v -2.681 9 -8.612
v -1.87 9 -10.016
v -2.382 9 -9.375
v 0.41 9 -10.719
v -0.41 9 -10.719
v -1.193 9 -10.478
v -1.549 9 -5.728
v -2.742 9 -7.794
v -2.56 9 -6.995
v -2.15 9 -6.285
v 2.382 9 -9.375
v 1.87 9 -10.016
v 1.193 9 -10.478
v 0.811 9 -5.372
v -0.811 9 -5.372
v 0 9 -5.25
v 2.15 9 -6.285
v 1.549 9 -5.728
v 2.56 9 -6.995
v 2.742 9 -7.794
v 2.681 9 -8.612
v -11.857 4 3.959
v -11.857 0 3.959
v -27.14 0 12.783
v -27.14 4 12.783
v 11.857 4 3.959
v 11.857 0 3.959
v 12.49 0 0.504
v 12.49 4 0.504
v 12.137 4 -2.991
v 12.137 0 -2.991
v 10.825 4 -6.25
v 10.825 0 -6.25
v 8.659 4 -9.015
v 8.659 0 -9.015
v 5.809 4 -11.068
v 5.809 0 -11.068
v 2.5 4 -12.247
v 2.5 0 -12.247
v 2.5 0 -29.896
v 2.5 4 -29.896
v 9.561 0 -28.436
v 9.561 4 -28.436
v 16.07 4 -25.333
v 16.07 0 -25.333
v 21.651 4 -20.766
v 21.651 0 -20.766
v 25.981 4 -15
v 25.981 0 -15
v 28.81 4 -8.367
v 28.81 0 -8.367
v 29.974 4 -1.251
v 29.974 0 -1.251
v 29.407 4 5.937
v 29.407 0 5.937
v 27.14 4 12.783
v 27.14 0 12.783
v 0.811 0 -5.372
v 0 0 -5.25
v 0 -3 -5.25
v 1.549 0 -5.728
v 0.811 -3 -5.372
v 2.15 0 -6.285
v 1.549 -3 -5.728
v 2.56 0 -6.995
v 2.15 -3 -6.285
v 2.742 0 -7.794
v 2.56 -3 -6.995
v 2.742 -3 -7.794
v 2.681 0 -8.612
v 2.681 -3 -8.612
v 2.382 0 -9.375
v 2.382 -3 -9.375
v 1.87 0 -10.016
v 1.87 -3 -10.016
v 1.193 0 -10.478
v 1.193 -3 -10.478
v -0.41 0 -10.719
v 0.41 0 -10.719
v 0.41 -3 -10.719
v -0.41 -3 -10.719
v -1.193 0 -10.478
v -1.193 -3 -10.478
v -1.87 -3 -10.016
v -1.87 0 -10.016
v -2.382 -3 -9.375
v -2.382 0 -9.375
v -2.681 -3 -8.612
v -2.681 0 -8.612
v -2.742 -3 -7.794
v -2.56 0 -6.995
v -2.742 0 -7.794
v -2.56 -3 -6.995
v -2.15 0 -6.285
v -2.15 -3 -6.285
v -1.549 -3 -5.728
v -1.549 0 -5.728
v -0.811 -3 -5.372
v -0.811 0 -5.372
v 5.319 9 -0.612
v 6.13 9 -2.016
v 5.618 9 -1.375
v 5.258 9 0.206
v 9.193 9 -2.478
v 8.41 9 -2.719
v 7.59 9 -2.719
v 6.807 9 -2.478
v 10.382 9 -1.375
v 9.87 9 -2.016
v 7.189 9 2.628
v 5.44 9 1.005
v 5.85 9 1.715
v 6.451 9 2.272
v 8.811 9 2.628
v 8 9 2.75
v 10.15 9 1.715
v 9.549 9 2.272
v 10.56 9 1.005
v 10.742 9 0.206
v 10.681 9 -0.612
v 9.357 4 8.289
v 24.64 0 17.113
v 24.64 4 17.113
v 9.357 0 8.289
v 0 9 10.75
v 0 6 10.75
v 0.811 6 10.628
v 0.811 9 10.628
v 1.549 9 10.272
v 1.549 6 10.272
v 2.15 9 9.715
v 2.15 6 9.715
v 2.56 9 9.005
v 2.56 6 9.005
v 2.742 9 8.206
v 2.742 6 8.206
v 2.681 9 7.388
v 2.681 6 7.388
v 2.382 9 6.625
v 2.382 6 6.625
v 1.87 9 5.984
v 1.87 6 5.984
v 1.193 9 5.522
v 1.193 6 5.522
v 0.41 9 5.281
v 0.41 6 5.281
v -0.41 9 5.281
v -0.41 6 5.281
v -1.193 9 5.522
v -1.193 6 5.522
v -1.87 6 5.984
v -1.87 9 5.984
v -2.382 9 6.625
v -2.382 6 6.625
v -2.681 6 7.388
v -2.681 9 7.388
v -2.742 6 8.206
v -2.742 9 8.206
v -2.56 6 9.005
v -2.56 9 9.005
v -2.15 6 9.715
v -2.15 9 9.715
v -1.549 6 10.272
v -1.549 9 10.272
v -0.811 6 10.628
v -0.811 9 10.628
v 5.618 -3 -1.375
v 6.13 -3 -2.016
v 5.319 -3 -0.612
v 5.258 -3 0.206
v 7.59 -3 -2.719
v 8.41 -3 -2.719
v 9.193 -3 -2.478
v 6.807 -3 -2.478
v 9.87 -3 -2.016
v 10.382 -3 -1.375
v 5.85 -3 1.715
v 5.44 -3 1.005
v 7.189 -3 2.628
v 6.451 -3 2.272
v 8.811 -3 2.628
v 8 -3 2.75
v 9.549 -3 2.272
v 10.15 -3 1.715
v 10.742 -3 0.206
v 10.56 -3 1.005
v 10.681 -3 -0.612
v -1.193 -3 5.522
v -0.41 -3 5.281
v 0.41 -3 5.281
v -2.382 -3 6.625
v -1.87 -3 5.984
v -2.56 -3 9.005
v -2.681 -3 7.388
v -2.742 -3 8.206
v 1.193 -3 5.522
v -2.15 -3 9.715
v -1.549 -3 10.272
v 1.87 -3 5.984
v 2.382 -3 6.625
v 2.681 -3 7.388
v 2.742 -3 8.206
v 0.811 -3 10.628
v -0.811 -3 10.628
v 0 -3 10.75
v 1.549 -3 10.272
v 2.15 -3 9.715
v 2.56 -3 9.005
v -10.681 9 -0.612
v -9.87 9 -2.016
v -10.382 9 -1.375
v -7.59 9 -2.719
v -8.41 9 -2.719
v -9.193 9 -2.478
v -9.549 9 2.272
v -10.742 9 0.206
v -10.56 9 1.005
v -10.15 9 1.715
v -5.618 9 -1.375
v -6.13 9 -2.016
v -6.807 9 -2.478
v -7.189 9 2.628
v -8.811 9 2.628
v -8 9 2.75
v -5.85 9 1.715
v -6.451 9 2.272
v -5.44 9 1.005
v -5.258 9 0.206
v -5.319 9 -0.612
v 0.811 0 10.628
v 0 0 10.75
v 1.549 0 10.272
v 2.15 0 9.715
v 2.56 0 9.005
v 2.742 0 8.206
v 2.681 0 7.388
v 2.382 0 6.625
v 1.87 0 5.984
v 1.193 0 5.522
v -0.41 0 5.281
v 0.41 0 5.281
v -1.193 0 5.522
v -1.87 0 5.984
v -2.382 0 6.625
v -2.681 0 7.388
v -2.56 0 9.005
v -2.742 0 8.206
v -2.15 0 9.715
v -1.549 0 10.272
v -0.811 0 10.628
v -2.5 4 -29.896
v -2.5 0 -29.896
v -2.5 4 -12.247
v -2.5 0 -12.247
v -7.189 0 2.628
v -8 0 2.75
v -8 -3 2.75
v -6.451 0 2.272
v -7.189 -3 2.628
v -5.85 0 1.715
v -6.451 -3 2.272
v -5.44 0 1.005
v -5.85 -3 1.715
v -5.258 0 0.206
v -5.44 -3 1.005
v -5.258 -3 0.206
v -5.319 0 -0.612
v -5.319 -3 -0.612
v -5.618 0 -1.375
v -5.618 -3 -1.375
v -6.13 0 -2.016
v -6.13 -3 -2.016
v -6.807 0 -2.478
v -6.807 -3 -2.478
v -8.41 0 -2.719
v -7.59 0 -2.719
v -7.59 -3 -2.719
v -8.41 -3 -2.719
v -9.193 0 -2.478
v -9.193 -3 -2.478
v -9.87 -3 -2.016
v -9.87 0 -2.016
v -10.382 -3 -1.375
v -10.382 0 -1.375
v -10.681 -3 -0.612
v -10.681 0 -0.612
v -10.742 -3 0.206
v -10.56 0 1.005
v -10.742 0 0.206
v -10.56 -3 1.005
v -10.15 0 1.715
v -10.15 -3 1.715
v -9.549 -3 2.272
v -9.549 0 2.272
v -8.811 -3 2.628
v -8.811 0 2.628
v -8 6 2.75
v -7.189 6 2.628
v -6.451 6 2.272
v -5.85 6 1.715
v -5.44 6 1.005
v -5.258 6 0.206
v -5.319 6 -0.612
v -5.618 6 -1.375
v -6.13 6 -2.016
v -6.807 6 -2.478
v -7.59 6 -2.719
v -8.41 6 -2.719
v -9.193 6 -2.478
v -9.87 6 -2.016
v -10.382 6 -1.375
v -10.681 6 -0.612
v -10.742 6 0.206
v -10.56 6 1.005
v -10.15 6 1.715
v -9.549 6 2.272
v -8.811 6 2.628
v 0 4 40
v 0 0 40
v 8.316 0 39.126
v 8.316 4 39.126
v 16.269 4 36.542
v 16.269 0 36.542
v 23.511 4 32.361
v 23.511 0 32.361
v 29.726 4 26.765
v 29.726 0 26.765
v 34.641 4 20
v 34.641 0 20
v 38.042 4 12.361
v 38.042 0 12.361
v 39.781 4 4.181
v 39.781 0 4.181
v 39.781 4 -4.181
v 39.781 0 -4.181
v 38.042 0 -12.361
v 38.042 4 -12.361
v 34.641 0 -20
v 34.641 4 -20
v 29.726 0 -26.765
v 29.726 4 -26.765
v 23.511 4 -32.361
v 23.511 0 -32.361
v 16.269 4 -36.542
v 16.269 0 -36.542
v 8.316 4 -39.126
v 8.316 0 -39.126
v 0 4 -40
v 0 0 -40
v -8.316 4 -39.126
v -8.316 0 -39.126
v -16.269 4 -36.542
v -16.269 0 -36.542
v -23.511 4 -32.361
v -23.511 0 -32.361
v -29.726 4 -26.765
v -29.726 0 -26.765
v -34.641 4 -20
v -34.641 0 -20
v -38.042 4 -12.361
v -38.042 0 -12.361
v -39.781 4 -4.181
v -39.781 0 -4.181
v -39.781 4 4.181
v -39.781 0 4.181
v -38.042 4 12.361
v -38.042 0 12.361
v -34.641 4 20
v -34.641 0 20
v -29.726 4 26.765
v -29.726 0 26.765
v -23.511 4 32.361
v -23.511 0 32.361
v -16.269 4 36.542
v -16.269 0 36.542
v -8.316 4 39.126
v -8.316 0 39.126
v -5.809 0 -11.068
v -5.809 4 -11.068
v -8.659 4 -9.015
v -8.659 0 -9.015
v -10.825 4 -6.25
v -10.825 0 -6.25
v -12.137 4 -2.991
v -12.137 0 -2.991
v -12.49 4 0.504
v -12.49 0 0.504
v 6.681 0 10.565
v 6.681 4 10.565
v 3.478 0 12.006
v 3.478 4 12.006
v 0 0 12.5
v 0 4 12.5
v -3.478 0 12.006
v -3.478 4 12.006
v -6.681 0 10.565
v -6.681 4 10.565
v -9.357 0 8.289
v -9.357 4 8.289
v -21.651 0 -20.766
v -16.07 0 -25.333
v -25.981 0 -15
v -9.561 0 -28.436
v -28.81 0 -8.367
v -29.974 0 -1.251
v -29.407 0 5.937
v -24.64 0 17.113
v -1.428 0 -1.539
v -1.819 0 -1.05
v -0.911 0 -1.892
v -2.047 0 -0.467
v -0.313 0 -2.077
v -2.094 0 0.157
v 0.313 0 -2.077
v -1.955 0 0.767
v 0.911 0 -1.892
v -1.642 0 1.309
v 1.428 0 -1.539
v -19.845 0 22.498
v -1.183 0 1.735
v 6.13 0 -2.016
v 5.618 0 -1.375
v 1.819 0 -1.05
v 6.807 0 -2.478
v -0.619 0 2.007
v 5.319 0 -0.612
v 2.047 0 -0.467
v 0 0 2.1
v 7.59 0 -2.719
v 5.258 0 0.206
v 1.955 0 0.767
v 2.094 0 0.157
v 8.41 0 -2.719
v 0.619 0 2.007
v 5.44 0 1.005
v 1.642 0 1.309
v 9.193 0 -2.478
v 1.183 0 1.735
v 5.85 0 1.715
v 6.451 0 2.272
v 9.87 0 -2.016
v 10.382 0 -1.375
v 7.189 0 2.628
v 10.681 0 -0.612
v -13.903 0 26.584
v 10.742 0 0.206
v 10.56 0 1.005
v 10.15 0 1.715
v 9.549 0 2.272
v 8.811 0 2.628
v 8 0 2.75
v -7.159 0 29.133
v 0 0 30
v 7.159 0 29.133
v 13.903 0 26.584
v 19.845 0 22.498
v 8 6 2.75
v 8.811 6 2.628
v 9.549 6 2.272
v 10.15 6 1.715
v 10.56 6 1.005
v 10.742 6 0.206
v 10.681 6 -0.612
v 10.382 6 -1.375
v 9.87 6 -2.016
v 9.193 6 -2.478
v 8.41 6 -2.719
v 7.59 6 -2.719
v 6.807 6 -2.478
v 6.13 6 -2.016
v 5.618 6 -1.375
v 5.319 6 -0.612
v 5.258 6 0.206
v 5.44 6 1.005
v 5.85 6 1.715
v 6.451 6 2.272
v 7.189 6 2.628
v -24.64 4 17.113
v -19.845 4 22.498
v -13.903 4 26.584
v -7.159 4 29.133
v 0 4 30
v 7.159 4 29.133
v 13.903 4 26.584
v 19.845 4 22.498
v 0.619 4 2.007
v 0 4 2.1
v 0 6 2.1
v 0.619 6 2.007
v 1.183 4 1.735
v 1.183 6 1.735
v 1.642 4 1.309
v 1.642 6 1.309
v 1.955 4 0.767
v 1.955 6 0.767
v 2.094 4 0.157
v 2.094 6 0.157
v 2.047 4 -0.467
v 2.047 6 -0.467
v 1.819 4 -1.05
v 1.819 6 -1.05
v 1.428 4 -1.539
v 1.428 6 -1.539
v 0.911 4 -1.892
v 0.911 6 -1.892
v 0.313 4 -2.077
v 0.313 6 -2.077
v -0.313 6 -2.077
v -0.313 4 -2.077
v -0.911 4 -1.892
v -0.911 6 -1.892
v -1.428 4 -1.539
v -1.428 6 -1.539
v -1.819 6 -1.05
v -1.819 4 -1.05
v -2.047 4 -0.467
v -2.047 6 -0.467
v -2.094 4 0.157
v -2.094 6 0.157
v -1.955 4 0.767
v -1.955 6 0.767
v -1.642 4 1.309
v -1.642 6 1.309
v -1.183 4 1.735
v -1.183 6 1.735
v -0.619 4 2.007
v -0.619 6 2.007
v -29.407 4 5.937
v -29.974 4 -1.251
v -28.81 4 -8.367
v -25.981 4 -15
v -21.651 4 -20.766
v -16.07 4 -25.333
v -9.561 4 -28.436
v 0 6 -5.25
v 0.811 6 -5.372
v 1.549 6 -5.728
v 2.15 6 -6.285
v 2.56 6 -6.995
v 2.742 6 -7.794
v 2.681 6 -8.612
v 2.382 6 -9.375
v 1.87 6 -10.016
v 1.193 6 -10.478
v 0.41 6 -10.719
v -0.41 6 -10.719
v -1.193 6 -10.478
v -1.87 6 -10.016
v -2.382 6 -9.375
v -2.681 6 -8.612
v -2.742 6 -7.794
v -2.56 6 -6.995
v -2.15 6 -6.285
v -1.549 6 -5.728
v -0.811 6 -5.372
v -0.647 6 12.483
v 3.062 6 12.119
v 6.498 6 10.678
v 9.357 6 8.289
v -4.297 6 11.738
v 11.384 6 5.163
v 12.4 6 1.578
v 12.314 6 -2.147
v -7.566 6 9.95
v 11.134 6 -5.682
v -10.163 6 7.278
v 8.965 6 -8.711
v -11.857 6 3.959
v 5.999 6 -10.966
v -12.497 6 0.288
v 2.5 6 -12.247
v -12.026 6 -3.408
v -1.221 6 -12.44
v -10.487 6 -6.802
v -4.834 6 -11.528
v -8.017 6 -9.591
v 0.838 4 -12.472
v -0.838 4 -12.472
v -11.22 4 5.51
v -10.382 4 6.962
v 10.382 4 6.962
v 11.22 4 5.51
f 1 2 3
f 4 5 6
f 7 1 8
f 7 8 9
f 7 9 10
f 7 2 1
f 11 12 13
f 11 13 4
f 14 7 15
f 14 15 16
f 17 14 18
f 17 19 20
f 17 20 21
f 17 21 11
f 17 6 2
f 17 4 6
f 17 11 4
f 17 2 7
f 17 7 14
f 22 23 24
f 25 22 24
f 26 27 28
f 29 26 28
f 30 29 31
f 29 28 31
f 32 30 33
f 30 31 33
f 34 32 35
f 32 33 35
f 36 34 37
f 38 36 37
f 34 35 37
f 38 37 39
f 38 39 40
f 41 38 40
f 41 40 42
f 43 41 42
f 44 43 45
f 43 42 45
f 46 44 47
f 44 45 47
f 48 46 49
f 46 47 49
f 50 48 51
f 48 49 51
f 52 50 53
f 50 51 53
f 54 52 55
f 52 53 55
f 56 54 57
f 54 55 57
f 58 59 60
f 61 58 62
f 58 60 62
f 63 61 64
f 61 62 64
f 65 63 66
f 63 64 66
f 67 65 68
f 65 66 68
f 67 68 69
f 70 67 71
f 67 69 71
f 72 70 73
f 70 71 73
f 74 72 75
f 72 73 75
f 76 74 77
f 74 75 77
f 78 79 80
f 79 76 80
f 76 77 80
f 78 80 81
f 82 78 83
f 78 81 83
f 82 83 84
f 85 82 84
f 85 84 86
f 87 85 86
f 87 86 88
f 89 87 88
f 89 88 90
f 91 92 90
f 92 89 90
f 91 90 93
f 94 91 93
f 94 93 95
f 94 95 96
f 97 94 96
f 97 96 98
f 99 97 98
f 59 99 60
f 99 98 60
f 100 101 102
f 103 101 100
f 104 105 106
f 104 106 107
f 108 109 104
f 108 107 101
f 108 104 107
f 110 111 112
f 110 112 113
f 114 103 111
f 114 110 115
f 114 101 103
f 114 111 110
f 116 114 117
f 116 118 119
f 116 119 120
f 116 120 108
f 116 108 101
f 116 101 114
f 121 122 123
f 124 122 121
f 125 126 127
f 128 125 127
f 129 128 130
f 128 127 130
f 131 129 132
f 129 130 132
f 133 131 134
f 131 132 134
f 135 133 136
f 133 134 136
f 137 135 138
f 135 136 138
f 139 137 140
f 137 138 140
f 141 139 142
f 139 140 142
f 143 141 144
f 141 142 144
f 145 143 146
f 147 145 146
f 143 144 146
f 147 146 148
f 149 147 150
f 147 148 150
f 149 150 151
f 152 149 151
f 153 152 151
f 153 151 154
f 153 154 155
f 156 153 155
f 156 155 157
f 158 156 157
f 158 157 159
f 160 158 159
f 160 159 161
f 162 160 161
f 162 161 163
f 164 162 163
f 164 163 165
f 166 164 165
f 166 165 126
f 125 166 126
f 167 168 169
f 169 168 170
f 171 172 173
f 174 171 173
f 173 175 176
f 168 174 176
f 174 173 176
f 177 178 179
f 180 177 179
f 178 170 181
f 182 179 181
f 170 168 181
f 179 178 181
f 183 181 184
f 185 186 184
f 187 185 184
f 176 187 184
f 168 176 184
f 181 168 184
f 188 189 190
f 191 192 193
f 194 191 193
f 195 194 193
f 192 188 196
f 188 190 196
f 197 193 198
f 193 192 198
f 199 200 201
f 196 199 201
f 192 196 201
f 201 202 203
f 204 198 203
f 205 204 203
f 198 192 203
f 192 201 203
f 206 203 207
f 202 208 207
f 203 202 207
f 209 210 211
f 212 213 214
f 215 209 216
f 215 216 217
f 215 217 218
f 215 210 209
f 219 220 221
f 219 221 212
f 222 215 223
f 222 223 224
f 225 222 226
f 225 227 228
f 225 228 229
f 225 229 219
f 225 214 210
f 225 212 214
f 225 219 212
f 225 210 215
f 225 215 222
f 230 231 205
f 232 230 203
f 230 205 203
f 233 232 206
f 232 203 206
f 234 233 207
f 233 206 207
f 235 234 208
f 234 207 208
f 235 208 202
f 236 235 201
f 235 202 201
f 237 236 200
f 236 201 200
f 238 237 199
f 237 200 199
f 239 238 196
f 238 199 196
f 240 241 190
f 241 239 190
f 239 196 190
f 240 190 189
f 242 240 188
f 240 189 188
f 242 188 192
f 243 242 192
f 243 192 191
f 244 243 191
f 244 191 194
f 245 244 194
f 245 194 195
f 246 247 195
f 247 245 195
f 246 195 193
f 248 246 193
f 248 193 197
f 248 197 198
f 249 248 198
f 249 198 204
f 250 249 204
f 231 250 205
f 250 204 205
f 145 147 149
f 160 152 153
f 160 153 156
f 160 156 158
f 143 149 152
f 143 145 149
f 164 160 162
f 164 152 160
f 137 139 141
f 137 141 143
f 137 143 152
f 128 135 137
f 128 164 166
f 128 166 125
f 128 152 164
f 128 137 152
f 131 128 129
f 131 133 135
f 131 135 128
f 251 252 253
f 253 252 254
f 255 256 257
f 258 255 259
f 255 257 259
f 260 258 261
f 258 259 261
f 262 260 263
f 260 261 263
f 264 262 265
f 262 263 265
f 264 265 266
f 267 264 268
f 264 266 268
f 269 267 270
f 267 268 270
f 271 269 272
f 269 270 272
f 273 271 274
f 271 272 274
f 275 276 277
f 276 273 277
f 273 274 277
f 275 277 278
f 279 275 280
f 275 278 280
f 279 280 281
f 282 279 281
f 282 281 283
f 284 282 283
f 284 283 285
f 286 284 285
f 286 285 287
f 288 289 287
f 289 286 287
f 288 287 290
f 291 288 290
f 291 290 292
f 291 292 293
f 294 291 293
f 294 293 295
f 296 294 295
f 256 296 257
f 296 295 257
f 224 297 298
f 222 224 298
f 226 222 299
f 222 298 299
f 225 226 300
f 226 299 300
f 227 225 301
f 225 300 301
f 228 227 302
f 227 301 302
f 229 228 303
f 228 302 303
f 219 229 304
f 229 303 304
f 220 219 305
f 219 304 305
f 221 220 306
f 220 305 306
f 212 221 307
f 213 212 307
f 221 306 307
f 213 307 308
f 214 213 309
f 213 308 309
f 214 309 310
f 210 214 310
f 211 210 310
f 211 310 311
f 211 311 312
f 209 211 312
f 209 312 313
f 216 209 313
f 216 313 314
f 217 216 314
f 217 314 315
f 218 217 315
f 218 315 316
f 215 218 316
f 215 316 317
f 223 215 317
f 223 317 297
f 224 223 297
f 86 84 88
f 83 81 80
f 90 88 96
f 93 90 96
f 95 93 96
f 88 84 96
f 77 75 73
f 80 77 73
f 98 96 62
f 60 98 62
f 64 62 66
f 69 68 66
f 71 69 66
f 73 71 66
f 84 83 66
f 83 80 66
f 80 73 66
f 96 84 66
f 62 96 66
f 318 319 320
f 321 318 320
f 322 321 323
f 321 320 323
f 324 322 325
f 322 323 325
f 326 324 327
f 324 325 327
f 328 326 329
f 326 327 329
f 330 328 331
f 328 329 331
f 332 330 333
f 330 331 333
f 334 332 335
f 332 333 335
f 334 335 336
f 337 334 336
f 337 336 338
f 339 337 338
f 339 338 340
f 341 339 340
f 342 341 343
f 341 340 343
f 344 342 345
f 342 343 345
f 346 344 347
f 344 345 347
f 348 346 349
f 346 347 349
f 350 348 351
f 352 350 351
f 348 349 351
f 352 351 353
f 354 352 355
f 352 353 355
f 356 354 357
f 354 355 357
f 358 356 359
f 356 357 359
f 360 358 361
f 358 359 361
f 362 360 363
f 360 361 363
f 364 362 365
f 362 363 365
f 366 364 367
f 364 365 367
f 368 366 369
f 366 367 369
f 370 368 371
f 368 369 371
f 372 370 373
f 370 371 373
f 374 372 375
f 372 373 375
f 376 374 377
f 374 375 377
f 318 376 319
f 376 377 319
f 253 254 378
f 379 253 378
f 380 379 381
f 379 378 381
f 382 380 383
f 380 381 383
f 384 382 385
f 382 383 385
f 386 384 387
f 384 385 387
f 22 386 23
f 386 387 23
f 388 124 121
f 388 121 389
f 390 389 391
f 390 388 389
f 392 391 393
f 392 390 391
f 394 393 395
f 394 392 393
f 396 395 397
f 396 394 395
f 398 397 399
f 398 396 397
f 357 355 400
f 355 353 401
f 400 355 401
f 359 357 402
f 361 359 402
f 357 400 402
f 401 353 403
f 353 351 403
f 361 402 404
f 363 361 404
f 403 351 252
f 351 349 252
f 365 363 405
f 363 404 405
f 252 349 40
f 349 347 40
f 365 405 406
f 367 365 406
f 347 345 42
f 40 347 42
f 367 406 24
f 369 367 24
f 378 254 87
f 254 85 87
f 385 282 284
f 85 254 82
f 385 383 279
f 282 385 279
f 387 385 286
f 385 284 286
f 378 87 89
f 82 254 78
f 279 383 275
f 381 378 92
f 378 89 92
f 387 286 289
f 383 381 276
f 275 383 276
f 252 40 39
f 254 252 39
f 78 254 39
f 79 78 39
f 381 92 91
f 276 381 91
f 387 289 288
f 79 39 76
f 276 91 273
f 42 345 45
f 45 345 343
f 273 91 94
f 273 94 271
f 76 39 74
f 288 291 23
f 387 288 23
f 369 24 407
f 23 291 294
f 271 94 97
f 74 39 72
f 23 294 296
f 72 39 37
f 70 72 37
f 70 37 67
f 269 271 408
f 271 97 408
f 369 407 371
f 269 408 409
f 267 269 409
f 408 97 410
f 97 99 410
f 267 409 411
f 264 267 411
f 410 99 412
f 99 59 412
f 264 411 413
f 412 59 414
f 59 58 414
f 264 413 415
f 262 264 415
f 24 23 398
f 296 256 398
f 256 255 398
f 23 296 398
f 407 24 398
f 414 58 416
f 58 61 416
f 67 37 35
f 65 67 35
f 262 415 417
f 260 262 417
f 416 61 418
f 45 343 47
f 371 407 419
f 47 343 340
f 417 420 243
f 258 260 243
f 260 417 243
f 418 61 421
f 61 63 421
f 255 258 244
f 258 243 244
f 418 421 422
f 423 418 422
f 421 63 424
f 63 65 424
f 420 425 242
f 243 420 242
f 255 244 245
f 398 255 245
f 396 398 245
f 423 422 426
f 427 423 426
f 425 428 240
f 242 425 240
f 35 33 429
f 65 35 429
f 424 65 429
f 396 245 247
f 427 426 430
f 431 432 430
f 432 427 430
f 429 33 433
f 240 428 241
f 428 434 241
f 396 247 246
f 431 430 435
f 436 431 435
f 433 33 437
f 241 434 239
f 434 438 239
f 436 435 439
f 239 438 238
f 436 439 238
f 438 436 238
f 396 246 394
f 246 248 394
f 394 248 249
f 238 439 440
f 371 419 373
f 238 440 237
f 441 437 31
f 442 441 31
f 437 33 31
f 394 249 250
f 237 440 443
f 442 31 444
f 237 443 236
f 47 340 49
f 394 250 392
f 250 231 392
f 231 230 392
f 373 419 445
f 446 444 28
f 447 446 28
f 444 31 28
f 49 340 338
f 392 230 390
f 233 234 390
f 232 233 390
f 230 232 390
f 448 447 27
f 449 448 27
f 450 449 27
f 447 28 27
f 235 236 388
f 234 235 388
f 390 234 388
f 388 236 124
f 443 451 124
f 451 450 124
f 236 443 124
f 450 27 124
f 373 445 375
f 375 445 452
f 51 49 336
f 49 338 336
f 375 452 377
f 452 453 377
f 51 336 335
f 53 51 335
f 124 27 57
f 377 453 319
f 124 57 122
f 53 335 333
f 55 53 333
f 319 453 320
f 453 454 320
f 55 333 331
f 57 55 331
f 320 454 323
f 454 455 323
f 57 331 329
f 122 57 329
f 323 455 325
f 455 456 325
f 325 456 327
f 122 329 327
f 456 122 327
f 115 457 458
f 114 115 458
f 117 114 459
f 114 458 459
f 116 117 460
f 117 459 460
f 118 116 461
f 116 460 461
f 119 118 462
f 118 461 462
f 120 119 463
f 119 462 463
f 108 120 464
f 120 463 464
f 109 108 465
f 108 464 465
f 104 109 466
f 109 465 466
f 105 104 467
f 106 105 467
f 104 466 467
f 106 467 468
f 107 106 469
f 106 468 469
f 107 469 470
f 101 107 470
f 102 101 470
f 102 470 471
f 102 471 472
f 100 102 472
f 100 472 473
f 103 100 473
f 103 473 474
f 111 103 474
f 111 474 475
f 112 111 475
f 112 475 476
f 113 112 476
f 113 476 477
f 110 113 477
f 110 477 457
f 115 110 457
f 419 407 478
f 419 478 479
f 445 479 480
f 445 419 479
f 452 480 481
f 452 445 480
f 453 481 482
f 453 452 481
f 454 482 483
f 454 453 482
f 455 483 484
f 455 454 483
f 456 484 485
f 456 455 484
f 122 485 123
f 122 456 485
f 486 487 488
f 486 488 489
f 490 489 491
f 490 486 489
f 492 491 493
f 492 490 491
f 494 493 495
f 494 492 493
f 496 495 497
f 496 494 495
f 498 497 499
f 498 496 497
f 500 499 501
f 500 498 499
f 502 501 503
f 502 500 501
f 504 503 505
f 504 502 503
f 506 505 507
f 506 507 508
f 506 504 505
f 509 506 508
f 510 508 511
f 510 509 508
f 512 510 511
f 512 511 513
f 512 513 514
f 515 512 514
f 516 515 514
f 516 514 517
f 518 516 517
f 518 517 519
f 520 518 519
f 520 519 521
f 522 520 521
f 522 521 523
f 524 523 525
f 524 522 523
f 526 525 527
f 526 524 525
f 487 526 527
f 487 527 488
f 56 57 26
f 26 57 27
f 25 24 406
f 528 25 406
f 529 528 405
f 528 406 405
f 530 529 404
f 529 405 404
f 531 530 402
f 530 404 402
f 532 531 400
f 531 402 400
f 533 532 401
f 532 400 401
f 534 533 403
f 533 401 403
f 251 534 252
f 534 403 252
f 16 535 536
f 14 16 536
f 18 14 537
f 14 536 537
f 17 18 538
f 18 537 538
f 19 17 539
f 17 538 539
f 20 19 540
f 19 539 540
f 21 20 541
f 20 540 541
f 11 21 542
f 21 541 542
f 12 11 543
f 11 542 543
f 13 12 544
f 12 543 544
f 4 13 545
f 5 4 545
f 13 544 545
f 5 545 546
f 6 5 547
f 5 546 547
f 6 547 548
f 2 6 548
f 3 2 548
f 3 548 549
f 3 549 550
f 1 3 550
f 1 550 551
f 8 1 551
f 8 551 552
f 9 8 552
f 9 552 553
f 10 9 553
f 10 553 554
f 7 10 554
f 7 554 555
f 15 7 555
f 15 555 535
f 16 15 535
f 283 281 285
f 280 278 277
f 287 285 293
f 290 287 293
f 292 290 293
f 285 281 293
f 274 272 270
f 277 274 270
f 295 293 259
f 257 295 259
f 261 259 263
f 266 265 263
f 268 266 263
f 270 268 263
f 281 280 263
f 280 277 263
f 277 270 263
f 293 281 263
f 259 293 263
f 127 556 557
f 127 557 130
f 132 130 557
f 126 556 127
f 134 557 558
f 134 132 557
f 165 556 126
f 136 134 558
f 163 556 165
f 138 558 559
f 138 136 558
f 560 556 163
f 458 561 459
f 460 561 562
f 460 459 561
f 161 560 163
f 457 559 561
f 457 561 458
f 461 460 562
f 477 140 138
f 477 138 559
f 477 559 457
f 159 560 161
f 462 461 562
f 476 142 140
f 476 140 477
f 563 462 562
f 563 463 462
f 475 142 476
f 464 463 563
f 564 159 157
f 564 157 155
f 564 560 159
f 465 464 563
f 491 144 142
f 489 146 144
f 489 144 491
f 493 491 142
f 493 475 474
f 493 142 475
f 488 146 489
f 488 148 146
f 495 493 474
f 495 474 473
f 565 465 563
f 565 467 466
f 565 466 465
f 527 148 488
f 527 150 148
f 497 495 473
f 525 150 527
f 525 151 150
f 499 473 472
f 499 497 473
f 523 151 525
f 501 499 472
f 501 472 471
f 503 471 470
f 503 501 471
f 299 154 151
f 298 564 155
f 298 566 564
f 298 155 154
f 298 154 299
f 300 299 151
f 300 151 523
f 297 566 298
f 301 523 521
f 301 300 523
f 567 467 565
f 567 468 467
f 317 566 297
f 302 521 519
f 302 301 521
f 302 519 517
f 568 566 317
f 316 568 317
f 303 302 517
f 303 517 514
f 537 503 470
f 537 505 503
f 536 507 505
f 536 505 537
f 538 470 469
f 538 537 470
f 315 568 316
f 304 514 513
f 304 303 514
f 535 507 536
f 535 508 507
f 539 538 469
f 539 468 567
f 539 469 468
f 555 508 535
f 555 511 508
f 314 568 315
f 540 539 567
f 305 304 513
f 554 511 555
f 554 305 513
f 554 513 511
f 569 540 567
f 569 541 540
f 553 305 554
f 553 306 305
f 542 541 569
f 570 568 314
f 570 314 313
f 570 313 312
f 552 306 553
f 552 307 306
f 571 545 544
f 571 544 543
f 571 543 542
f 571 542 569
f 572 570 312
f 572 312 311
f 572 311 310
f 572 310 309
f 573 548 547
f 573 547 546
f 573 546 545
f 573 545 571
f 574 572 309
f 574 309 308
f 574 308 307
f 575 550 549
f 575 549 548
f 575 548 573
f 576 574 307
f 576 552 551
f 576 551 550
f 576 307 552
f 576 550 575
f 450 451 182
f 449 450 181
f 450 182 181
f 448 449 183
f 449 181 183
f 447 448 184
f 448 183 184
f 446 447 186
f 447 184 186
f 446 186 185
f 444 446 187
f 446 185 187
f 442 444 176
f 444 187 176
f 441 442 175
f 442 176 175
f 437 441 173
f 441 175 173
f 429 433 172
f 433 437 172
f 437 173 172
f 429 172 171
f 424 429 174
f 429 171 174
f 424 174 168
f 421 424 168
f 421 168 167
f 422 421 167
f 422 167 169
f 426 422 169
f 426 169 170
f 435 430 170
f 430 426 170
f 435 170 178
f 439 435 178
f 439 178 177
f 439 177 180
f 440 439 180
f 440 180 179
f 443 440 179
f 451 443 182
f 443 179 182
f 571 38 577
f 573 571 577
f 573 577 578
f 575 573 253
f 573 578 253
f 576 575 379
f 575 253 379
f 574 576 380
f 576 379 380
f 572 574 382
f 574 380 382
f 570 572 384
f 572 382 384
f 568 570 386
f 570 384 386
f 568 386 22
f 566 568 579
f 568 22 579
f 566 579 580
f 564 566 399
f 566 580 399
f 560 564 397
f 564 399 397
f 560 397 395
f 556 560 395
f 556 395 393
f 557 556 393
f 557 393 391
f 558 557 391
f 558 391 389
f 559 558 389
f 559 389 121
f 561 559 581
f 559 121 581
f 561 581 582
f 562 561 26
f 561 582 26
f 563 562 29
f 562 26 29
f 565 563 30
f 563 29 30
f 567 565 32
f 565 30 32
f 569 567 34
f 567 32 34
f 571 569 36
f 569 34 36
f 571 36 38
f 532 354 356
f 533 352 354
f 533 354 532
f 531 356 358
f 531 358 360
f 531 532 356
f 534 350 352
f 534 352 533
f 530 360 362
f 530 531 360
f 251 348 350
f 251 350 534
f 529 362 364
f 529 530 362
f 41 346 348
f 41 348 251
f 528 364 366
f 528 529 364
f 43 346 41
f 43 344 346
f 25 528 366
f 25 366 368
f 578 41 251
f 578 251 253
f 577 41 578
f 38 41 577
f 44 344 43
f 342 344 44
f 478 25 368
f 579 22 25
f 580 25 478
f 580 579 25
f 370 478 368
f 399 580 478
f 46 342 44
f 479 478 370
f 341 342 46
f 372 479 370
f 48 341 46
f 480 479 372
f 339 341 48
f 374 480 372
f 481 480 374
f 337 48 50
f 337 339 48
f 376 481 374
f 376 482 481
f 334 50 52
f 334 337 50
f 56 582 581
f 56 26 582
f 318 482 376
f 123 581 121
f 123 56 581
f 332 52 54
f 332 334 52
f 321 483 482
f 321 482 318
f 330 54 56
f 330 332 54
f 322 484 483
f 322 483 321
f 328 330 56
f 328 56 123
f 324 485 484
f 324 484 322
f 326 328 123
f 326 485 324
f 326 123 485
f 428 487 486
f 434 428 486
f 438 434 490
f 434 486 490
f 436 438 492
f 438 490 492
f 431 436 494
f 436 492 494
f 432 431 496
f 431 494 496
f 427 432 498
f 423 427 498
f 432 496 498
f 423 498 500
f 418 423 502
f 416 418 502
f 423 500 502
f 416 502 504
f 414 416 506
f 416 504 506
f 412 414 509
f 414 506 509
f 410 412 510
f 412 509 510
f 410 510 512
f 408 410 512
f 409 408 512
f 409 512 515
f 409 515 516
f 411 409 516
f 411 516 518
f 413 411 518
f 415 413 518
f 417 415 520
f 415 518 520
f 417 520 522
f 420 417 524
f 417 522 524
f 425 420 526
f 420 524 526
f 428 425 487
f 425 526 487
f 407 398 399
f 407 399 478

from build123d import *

# Parameters (mm, degrees)
ESBO_O1_R                     = 40
RESSALTO_EXTRUS_O1_DEPTH      = 4
ESBO_O2_R                     = 2.1
CORTE_EXTRUS_O1_DEPTH         = 4
ESBO_O3_R                     = 12.5
ESBO_O3_R_2                   = 2.1
RESSALTO_EXTRUS_O2_DEPTH      = 2
RESSALTO_EXTRUS_O3_DEPTH      = 3
RESSALTO_EXTRUS_O3_DEPTH_BACK = 9
ESBO_O4_R                     = 2.75


with BuildPart() as part:
    # Esboço1 → Ressalto-extrusão1 (new body)
    with BuildSketch(Plane(origin=(0, 0, 0), x_dir=(1, 0, 0), z_dir=(0, 1, 0))):
        Circle(ESBO_O1_R)
        with BuildLine():
            Line((-9.356601718, -8.288787866), (-24.640393972, -17.112889438))
            ThreePointArc((-24.640393972, -17.112889438), (0, -30), (24.640393972, -17.112889438))
            Line((24.640393972, -17.112889438), (9.356601718, -8.288787866))
            ThreePointArc((9.356601718, -8.288787866), (0, -12.5), (-9.356601718, -8.288787866))
        make_face(mode=Mode.SUBTRACT)
        with BuildLine():
            Line((-11.856601718, -3.958660847), (-27.140393972, -12.782762419))
            ThreePointArc((-27.140393972, -12.782762419), (-25.980762114, 15), (-2.5, 29.895651858))
            Line((-2.5, 29.895651858), (-2.5, 12.247448714))
            ThreePointArc((-2.5, 12.247448714), (-10.825317547, 6.25), (-11.856601718, -3.958660847))
        make_face(mode=Mode.SUBTRACT)
        with BuildLine():
            Line((2.5, 12.247448714), (2.5, 29.895651858))
            ThreePointArc((2.5, 29.895651858), (25.980762114, 15), (27.140393972, -12.782762419))
            Line((27.140393972, -12.782762419), (11.856601718, -3.958660847))
            ThreePointArc((11.856601718, -3.958660847), (10.825317547, 6.25), (2.5, 12.247448714))
        make_face(mode=Mode.SUBTRACT)
    extrude(amount=RESSALTO_EXTRUS_O1_DEPTH)

    # Esboço2 → Corte-extrusão1 (cut)
    with BuildSketch(Plane(origin=(0, 4, 0), x_dir=(1, 0, 0), z_dir=(0, 1, 0))):
        Circle(ESBO_O2_R)
    extrude(amount=-CORTE_EXTRUS_O1_DEPTH, mode=Mode.SUBTRACT)

    # Esboço3 → Ressalto-extrusão2 (add)
    with BuildSketch(Plane(origin=(0, 4, 0), x_dir=(1, 0, 0), z_dir=(0, 1, 0))):
        Circle(ESBO_O3_R)
        Circle(ESBO_O3_R_2, mode=Mode.SUBTRACT)
    extrude(amount=RESSALTO_EXTRUS_O2_DEPTH)

    # Esboço4 → Ressalto-extrusão3 (add, two sides: drawn at the far end of the back side and taken through both)
    with BuildSketch(Plane(origin=(0, 6, 0), x_dir=(1, 0, 0), z_dir=(0, 1, 0)).offset(-RESSALTO_EXTRUS_O3_DEPTH_BACK)):
        with Locations((0, 8)):
            Circle(ESBO_O4_R)
        with Locations((8, 0)):
            Circle(ESBO_O4_R)
        with Locations((0, -8)):
            Circle(ESBO_O4_R)
        with Locations((-8, 0)):
            Circle(ESBO_O4_R)
    extrude(amount=RESSALTO_EXTRUS_O3_DEPTH + RESSALTO_EXTRUS_O3_DEPTH_BACK)


solid = part.part
